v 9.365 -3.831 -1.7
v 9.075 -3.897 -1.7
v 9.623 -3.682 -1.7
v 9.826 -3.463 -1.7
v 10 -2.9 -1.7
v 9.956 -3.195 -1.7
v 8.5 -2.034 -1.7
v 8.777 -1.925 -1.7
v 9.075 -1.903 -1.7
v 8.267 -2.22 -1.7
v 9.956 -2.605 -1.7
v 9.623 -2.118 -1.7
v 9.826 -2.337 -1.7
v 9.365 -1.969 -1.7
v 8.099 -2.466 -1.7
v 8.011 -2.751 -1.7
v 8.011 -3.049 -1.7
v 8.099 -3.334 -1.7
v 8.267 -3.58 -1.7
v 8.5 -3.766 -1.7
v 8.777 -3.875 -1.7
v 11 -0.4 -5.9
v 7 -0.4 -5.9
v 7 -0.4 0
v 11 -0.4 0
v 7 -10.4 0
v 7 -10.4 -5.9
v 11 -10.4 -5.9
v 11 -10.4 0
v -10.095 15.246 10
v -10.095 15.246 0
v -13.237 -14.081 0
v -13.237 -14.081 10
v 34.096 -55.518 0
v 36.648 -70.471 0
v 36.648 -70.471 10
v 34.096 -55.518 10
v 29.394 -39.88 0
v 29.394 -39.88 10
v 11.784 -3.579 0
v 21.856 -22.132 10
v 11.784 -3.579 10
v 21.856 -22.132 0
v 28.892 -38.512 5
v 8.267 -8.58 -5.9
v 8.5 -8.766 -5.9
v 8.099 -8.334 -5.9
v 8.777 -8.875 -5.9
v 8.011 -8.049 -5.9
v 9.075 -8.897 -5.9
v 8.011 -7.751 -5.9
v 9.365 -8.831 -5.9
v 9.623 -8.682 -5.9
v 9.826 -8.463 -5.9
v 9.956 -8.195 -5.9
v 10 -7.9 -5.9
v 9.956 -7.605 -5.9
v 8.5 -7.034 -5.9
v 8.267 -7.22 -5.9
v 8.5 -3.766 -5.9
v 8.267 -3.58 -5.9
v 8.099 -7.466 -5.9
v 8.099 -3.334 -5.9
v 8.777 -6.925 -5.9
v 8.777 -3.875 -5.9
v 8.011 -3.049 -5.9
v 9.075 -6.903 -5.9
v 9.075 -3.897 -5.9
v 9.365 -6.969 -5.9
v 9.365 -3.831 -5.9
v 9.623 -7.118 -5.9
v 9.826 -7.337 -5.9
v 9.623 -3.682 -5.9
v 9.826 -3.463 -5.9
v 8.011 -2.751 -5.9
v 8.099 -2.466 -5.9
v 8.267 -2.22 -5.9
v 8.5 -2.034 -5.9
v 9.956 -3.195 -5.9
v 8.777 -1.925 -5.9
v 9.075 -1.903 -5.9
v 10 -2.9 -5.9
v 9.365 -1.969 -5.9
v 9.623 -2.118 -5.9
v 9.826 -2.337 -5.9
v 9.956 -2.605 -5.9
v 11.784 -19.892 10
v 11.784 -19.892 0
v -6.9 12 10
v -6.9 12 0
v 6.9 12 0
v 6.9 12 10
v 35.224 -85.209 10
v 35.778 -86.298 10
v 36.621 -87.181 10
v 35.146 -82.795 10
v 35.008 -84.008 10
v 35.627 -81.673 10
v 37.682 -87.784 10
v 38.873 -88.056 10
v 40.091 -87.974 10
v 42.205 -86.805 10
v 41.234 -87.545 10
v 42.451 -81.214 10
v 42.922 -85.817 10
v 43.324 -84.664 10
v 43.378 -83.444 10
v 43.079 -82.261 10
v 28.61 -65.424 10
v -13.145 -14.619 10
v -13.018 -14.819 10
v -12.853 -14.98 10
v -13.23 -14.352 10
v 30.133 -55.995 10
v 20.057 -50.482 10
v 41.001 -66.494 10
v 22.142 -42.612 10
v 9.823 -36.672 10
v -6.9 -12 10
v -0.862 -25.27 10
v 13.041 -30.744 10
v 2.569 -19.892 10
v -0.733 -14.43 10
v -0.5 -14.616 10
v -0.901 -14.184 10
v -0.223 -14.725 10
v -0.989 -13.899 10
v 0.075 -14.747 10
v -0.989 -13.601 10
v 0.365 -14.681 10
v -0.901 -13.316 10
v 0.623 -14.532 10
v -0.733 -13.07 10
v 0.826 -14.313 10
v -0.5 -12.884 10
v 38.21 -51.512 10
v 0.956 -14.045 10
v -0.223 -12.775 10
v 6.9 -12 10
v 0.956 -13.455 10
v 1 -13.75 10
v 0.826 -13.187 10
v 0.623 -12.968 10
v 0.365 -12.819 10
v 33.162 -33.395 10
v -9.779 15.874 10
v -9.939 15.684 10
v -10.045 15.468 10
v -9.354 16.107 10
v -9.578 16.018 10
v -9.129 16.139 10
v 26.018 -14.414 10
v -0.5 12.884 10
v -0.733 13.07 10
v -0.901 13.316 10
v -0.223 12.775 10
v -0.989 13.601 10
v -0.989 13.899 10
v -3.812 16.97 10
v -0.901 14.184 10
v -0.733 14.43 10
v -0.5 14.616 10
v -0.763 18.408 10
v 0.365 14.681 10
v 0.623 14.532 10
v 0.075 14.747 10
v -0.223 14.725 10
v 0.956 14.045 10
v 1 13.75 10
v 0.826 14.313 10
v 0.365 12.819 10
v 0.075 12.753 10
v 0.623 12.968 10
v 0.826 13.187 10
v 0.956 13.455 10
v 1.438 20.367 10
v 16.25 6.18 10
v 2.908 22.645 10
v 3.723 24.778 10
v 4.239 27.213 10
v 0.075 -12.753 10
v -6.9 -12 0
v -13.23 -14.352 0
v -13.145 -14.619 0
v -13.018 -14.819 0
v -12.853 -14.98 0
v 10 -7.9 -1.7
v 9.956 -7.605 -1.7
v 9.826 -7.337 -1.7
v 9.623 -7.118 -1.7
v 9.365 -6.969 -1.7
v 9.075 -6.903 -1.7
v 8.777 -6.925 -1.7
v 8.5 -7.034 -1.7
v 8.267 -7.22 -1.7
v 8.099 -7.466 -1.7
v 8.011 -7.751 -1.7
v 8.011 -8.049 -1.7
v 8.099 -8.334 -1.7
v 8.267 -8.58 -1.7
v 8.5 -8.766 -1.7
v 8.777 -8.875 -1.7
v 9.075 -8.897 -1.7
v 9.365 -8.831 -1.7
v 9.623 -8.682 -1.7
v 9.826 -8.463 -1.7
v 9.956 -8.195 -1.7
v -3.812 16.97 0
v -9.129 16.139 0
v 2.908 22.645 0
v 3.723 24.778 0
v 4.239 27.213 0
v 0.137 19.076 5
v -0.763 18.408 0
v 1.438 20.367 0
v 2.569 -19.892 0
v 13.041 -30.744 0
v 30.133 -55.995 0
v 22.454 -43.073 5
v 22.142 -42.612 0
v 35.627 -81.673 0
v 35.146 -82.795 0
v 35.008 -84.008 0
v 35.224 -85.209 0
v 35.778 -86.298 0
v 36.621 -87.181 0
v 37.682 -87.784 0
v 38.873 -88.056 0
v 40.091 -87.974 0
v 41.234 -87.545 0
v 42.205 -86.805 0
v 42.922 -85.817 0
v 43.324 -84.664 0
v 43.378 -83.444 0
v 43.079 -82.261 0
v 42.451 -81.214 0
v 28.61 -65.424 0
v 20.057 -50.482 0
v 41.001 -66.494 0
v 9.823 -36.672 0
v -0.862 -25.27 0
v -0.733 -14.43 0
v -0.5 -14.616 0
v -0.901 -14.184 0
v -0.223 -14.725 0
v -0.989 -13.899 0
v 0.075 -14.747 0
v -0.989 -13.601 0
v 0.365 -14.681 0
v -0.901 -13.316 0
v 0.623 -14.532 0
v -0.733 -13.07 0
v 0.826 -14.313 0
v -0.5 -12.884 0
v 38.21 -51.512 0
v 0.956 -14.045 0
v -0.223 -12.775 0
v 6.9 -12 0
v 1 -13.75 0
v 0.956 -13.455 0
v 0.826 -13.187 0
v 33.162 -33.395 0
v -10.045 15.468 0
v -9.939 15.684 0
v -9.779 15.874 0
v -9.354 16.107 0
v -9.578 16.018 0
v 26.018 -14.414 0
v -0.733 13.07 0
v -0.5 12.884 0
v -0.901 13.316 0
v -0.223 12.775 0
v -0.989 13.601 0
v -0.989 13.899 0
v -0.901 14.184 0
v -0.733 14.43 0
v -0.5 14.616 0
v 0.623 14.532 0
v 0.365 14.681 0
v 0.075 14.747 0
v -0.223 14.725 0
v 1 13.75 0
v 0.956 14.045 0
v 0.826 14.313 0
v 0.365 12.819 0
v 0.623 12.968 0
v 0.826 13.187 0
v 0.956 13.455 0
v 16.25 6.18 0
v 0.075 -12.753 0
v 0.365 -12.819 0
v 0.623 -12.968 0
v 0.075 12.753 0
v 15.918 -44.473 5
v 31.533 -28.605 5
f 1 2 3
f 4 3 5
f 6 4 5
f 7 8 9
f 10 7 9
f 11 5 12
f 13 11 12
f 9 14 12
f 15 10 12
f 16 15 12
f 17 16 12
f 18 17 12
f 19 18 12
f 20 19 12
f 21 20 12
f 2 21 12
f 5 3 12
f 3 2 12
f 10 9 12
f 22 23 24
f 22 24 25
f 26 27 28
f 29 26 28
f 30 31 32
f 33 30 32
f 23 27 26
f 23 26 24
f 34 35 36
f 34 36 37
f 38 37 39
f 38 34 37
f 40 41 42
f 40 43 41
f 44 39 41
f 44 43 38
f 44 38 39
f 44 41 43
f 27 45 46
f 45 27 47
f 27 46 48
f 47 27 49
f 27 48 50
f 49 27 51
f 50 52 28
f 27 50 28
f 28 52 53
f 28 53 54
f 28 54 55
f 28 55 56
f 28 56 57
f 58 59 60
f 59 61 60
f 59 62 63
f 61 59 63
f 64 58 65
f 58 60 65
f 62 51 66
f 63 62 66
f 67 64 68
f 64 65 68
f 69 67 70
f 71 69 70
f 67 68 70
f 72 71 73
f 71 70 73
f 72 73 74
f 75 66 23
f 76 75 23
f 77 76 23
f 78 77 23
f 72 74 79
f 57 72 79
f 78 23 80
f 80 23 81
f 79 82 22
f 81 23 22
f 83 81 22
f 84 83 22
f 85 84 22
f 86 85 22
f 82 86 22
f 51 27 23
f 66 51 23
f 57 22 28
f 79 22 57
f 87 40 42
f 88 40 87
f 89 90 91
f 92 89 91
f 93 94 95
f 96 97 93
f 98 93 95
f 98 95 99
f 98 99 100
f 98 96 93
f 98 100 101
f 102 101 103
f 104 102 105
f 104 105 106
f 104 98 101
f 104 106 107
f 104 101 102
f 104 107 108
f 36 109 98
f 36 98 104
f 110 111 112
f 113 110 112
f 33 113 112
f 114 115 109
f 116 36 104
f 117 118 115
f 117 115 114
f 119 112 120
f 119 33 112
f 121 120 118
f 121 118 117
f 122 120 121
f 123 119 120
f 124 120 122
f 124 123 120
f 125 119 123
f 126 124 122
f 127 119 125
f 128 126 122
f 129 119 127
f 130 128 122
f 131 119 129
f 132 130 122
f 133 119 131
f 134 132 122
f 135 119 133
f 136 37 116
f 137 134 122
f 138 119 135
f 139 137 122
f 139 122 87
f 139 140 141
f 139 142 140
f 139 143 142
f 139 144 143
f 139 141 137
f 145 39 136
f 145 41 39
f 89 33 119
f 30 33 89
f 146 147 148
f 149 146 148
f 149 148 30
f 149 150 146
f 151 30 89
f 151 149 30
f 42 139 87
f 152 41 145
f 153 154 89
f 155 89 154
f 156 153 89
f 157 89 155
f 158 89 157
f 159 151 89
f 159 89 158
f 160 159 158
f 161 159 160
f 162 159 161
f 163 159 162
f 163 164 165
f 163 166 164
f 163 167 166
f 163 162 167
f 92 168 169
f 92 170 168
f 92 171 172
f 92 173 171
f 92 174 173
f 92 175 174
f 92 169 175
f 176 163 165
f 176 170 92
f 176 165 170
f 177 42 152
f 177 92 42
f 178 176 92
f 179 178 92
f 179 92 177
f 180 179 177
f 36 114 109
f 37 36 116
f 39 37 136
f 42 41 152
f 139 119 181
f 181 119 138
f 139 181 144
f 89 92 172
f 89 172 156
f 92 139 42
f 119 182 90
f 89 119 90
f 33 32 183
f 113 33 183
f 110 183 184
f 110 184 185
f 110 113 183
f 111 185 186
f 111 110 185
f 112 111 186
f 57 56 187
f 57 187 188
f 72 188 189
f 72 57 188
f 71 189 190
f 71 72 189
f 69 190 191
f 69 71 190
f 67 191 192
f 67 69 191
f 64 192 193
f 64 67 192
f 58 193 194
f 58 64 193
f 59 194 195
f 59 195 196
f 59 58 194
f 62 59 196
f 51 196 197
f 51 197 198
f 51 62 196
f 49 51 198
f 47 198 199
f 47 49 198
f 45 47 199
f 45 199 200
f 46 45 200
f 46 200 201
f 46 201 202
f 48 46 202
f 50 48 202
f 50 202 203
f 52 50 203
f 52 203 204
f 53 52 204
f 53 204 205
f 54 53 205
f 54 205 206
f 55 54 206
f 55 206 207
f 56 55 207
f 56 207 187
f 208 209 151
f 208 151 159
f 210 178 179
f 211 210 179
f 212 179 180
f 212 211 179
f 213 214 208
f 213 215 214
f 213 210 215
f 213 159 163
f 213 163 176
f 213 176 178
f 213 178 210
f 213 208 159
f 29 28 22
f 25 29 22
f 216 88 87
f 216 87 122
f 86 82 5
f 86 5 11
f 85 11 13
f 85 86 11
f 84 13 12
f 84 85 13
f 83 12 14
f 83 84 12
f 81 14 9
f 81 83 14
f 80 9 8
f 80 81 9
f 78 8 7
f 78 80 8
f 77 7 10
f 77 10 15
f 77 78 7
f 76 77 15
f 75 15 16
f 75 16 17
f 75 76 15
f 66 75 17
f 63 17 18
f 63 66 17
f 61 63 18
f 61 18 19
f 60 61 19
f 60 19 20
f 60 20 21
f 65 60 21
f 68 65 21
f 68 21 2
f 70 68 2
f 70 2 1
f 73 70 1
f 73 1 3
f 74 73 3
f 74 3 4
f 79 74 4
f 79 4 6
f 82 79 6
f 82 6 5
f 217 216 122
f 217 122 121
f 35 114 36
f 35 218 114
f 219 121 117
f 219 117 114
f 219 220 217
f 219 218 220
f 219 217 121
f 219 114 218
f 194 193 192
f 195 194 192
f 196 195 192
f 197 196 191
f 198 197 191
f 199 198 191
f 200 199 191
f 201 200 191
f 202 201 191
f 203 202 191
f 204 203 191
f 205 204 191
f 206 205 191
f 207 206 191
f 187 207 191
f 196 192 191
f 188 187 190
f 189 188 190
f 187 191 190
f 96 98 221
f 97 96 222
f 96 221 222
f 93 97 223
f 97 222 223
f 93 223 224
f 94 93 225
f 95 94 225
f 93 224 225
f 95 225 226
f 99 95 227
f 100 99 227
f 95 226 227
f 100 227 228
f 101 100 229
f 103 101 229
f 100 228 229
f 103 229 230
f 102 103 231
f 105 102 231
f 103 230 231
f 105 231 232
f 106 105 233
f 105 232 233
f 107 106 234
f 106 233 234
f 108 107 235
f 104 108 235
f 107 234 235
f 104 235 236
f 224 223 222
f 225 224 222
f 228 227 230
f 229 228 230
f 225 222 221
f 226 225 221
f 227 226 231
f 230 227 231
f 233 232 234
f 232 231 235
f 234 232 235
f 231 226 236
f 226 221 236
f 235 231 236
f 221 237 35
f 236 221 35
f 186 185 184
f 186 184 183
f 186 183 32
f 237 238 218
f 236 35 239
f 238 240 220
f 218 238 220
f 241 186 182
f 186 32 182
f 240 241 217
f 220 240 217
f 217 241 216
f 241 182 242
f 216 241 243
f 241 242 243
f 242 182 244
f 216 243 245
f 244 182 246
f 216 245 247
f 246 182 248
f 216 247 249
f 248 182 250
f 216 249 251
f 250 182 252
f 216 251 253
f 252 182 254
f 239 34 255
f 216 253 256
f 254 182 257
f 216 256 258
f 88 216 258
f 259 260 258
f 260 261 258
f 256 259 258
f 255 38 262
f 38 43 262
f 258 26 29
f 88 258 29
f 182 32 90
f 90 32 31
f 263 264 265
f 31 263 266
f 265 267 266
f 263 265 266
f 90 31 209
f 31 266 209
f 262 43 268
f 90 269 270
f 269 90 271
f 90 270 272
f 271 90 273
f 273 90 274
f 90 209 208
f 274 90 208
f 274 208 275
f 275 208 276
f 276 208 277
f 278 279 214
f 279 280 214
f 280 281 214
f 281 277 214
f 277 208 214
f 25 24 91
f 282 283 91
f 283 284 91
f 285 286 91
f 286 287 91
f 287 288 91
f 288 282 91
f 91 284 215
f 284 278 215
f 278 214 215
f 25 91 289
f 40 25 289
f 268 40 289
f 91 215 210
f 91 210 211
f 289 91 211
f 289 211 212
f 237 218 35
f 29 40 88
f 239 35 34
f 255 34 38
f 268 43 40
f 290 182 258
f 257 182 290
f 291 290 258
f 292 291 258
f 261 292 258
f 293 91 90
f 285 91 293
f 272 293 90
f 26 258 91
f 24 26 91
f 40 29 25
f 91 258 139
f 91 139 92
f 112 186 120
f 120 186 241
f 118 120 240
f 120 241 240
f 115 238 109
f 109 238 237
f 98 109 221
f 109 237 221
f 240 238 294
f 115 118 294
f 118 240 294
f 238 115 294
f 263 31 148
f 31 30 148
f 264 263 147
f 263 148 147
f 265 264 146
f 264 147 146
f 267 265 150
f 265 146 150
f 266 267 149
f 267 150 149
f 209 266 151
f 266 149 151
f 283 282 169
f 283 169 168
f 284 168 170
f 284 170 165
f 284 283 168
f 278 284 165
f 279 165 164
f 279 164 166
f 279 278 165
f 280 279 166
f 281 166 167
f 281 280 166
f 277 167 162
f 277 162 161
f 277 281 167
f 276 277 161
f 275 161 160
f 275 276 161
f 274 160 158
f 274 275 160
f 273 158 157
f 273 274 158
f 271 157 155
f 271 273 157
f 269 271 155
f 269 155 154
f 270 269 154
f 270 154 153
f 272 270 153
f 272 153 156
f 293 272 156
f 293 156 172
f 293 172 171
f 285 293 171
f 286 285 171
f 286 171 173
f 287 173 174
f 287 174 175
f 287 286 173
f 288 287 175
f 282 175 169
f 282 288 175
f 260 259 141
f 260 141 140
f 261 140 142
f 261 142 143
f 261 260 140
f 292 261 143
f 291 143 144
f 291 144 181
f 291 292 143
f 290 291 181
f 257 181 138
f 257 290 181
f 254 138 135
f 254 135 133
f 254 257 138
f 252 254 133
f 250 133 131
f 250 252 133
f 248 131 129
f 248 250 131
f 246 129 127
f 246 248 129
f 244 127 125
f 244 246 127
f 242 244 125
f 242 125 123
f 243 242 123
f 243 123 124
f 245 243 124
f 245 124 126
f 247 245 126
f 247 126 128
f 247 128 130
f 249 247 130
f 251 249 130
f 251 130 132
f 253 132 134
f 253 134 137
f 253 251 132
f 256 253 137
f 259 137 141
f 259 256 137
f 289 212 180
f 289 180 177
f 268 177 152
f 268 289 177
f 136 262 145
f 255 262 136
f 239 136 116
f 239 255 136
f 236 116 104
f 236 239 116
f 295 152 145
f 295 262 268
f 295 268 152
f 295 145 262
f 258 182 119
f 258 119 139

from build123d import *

# Parameters (mm, degrees)
CYLINDER020_R     = 1
CYLINDER020_DEPTH = 10
CYLINDER019_R     = 1
CYLINDER019_DEPTH = 10
BOX008_W          = 4
BOX008_H          = 10
BOX008_DEPTH      = 8.9
SKETCH003_W       = 13.8
SKETCH003_H       = 24
SKETCH003_R       = 1
EXTRUDE003_DEPTH  = 10
FILLET001_R       = 1


with BuildPart() as cylinder020:
    # Cylinder020 → Cylinder020 (new body)
    with BuildSketch(Plane(origin=(9, -2.9, -11.7), x_dir=(1, 0, 0), z_dir=(0, 0, 1))):
        Circle(CYLINDER020_R)
    extrude(amount=CYLINDER020_DEPTH)


with BuildPart() as cylinder019:
    # Cylinder019 → Cylinder019 (new body)
    with BuildSketch(Plane(origin=(9, -7.9, -11.7), x_dir=(1, 0, 0), z_dir=(0, 0, 1))):
        Circle(CYLINDER019_R)
    extrude(amount=CYLINDER019_DEPTH)


with BuildPart() as cube:
    # Box008 → Box008 (new body)
    with BuildSketch(Plane(origin=(7, -10.4, -5.9), x_dir=(1, 0, 0), z_dir=(0, 0, 1))):
        with Locations((2, 5)):
            Rectangle(BOX008_W, BOX008_H)
    extrude(amount=BOX008_DEPTH)


with BuildPart() as version_final:
    # Sketch003 → Extrude003 (new body)
    with BuildSketch(Plane.XY):
        with BuildLine():
            Line((-10, 16.128428), (-13.297334, -14.6392))
            add(Edge.make_bspline(
                [(-13.297334, -14.6392), (20.347338, -40.345566), (35.627229, -81.672969)],
                knots=[0, 0, 0, 1, 1, 1], degree=2))
            ThreePointArc((35.627229, -81.672969), (39.484607, -88.059425), (42.451137, -81.213558))
            add(Edge.make_bspline(
                [(4.23934, 27.2126), (39.721497, -30.208815), (42.451137, -81.213558)],
                knots=[0, 0, 0, 1, 1, 1], degree=2))
            add(Edge.make_bspline(
                [(-10, 16.128428), (2.6632, 16.087), (4.23934, 27.2126)],
                knots=[0, 0, 0, 1, 1, 1], degree=2))
        make_face()
        Rectangle(SKETCH003_W, SKETCH003_H, mode=Mode.SUBTRACT)
        with Locations((0, -13.75)):
            Circle(SKETCH003_R, mode=Mode.SUBTRACT)
        with Locations((0, 13.75)):
            Circle(SKETCH003_R, mode=Mode.SUBTRACT)
        with BuildLine():
            add(Edge.make_bspline(
                [(2.569153, -19.891897), (25.299458, -40.964581), (36.64809, -70.471016)],
                knots=[0, 0, 0, 1, 1, 1], degree=2))
            add(Edge.make_bspline(
                [(36.64809, -70.471016), (33.5686, -40), (11.784026, -3.578896)],
                knots=[0, 0, 0, 1, 1, 1], degree=2))
            Line((11.784026, -3.578896), (11.784026, -19.891897))
            Line((11.784026, -19.891897), (2.569153, -19.891897))
        make_face(mode=Mode.SUBTRACT)
    extrude(amount=EXTRUDE003_DEPTH)

    # Fillet001
    fillet001_edges = [version_final.edges().sort_by_distance(p)[0] for p in [
        (-10, 16.128428, 5),
        (-13.297334, -14.6392, 5),
    ]]
    fillet(fillet001_edges, radius=FILLET001_R)

    # Fusion012: union Cube
    add(cube.part)

    # Cut006: cut Cylinder019
    add(cylinder019.part, mode=Mode.SUBTRACT)

    # Cut007: cut Cylinder020
    add(cylinder020.part, mode=Mode.SUBTRACT)


solid = version_final.part
